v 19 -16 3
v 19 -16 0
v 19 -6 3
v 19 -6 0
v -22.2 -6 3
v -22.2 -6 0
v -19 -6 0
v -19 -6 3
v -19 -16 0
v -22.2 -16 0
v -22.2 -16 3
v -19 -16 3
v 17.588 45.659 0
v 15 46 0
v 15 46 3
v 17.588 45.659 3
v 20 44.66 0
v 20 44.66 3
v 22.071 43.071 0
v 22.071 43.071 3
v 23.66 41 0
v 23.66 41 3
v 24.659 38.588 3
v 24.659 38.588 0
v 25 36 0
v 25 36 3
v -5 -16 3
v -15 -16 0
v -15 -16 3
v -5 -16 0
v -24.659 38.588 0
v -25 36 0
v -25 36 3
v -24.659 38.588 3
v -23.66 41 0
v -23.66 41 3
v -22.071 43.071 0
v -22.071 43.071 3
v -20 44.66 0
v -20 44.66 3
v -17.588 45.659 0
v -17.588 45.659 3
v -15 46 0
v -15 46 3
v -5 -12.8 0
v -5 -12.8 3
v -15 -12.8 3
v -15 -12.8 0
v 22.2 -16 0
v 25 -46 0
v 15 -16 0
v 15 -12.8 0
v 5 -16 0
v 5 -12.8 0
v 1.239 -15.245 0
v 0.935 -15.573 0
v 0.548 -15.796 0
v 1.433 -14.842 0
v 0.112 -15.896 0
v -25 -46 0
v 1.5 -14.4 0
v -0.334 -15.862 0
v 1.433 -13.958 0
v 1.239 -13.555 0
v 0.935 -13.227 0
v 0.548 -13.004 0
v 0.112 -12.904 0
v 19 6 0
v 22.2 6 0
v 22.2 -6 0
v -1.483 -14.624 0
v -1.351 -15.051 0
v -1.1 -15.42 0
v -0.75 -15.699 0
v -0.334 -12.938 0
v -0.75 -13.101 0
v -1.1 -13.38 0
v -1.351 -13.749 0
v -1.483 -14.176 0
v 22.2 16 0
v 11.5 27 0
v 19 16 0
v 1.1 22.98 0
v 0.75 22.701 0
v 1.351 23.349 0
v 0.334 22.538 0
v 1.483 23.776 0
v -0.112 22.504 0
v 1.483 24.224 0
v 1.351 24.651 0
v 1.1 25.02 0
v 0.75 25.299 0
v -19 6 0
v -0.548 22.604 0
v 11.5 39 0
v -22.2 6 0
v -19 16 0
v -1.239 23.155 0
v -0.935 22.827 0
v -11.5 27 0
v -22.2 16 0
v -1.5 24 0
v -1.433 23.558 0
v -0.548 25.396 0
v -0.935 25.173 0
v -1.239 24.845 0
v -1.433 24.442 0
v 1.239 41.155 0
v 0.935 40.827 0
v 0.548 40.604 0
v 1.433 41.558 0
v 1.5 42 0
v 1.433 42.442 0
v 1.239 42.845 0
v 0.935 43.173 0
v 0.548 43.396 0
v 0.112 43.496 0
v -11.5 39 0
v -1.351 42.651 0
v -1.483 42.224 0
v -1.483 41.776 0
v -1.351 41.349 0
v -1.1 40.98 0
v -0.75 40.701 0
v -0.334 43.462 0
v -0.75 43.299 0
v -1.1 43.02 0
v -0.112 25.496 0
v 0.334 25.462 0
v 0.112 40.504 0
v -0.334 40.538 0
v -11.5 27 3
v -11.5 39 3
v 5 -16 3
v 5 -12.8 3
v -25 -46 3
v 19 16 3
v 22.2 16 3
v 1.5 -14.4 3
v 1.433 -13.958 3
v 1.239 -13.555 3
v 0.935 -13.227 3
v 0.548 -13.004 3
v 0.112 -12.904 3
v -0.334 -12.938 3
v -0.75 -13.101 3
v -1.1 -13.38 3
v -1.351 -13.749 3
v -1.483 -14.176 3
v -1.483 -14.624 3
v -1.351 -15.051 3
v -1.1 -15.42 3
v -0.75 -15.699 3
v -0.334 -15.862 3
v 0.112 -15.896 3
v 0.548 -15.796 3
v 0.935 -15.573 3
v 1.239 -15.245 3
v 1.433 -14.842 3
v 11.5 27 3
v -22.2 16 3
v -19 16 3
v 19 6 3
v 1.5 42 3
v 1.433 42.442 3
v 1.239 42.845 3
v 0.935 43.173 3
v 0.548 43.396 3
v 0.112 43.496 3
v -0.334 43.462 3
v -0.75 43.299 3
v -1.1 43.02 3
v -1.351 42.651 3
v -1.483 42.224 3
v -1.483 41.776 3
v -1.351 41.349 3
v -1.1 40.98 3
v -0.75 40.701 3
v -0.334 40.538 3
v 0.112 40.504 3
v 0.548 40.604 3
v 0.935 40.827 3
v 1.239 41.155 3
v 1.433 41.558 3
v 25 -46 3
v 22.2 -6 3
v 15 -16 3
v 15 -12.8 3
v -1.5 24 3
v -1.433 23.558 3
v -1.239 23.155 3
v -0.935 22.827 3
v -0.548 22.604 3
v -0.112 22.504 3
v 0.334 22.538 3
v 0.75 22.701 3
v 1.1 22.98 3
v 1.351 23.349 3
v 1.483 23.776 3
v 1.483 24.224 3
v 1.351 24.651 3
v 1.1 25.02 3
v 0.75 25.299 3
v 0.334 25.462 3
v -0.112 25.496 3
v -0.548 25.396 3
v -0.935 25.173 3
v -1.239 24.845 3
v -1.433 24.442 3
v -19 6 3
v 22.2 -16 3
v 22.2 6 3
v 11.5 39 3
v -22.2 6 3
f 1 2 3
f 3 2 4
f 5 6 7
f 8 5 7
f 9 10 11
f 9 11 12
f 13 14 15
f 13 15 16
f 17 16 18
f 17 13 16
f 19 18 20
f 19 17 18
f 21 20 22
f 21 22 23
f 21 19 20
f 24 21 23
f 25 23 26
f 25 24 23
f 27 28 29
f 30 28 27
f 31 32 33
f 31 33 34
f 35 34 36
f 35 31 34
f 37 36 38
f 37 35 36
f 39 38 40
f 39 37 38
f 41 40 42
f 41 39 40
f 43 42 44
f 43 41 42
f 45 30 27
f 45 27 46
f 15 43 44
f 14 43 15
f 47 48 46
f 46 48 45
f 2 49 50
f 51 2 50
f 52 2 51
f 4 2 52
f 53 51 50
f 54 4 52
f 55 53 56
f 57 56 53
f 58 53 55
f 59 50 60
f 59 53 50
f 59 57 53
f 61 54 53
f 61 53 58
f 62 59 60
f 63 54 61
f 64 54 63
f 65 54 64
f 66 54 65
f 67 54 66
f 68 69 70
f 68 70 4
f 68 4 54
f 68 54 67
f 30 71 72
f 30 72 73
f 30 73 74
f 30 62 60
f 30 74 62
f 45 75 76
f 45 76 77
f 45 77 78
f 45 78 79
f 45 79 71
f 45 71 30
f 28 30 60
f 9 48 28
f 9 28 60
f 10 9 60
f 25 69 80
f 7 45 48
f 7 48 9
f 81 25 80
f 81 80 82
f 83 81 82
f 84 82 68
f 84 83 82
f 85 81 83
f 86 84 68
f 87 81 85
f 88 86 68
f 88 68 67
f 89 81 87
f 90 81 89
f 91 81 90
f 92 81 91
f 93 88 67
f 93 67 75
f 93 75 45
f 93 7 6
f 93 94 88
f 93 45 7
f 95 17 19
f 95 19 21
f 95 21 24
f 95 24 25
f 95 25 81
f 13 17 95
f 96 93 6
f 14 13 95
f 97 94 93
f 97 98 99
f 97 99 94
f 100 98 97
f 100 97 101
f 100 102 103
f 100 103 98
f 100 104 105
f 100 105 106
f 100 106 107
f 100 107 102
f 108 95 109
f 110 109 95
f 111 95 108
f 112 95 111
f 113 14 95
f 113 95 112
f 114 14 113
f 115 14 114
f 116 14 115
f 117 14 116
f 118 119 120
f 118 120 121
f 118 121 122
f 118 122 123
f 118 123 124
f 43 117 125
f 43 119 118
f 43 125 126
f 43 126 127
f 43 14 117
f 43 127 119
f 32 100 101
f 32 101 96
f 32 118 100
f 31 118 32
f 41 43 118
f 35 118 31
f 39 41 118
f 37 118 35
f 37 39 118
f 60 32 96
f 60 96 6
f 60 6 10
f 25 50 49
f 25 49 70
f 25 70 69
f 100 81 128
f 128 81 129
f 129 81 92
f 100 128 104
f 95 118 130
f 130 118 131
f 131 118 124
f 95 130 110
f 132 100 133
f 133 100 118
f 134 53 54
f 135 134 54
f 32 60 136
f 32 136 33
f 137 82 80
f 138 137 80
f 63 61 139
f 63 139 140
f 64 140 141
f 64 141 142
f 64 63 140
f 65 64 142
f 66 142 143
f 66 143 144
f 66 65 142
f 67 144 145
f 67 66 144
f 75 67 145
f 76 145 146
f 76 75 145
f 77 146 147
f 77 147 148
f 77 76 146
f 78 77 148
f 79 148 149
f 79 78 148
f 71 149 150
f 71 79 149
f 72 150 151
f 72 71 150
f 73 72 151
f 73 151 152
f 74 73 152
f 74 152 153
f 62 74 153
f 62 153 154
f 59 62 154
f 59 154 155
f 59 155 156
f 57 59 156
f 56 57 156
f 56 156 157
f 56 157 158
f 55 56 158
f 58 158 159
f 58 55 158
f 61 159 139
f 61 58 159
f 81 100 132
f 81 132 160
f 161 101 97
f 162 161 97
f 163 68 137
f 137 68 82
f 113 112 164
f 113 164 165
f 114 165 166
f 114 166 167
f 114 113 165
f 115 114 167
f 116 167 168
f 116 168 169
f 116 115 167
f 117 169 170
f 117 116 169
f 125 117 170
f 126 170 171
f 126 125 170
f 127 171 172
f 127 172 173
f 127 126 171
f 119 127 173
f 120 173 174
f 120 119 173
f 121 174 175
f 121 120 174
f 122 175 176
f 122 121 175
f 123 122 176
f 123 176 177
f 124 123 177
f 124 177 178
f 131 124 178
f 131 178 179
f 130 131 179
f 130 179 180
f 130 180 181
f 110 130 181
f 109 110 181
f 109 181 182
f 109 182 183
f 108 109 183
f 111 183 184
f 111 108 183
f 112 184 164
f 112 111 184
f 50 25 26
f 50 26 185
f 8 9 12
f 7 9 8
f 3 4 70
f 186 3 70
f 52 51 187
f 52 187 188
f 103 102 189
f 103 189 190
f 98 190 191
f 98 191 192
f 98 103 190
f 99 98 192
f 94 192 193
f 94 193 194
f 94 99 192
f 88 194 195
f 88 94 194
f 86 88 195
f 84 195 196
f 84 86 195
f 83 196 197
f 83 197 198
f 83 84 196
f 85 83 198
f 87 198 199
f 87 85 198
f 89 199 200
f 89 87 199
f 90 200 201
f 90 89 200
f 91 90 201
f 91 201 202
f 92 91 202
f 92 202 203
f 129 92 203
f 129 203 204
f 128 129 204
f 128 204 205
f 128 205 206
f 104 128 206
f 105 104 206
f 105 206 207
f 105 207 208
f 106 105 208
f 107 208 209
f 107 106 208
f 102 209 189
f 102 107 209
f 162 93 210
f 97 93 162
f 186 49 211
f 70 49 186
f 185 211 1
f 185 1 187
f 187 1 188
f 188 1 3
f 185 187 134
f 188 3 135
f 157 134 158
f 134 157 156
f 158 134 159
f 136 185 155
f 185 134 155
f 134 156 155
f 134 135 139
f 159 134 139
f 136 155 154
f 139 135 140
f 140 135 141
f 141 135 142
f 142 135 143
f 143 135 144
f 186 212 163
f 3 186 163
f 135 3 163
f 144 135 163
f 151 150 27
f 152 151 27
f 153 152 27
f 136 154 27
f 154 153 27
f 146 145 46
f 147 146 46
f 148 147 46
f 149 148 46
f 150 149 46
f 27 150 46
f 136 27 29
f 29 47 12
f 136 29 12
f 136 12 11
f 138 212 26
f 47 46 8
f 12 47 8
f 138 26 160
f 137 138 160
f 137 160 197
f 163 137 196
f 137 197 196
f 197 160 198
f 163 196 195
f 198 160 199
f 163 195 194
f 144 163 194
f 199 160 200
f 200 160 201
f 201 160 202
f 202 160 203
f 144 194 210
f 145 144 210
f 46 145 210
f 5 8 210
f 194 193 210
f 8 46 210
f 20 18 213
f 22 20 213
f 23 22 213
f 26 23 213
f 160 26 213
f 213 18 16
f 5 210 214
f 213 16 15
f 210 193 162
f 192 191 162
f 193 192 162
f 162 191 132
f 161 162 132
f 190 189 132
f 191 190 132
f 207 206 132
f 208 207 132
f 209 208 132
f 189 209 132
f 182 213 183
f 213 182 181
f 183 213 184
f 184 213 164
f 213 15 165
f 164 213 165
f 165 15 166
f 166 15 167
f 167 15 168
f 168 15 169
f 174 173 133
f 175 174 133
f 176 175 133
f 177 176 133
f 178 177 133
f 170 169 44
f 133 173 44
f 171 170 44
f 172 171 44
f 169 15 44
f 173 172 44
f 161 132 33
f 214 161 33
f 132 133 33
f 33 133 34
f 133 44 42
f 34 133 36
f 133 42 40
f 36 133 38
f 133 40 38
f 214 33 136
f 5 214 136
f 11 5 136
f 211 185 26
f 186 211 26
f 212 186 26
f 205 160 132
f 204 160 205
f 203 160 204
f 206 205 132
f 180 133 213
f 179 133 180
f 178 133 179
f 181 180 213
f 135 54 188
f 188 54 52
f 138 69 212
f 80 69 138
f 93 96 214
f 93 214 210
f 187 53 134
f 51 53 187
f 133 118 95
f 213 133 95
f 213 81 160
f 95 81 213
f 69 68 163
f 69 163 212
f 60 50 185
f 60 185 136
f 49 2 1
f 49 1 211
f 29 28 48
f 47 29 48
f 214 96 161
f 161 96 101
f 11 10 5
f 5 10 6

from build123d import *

# Parameters (mm, degrees)
CROQUIS1_R              = 1.5
CROQUIS1_W              = 3.2
CROQUIS1_H              = 10
CROQUIS1_W_2            = 23
CROQUIS1_H_2            = 12
CROQUIS1_W_3            = 10
CROQUIS1_H_3            = 3.2
SALIENTE_EXTRUIR1_DEPTH = 3


with BuildPart() as part:
    # Croquis1 → Saliente-Extruir1 (new body)
    with BuildSketch(Plane.XY):
        with BuildLine():
            Line((25, -46), (-25, -46))
            Line((-25, -46), (-25, 36))
            ThreePointArc((-25, 36), (-22.071067812, 43.071067812), (-15, 46))
            Line((-15, 46), (15, 46))
            ThreePointArc((15, 46), (22.071067812, 43.071067812), (25, 36))
            Line((25, 36), (25, -46))
        make_face()
        with Locations((0, 42)):
            Circle(CROQUIS1_R, mode=Mode.SUBTRACT)
        with Locations(Location((0, 24, 0), (0, 0, 180))):
            Circle(CROQUIS1_R, mode=Mode.SUBTRACT)
        with Locations((0, -14.4)):
            Circle(CROQUIS1_R, mode=Mode.SUBTRACT)
        with Locations((-20.6, 11)):
            Rectangle(CROQUIS1_W, CROQUIS1_H, mode=Mode.SUBTRACT)
        with Locations((-20.6, -11)):
            Rectangle(CROQUIS1_W, CROQUIS1_H, mode=Mode.SUBTRACT)
        with Locations((20.6, 11)):
            Rectangle(CROQUIS1_W, CROQUIS1_H, mode=Mode.SUBTRACT)
        with Locations((20.6, -11)):
            Rectangle(CROQUIS1_W, CROQUIS1_H, mode=Mode.SUBTRACT)
        with Locations((0, 33)):
            Rectangle(CROQUIS1_W_2, CROQUIS1_H_2, mode=Mode.SUBTRACT)
        with Locations((10, -14.4)):
            Rectangle(CROQUIS1_W_3, CROQUIS1_H_3, mode=Mode.SUBTRACT)
        with Locations((-10, -14.4)):
            Rectangle(CROQUIS1_W_3, CROQUIS1_H_3, mode=Mode.SUBTRACT)
    extrude(amount=SALIENTE_EXTRUIR1_DEPTH)


solid = part.part
